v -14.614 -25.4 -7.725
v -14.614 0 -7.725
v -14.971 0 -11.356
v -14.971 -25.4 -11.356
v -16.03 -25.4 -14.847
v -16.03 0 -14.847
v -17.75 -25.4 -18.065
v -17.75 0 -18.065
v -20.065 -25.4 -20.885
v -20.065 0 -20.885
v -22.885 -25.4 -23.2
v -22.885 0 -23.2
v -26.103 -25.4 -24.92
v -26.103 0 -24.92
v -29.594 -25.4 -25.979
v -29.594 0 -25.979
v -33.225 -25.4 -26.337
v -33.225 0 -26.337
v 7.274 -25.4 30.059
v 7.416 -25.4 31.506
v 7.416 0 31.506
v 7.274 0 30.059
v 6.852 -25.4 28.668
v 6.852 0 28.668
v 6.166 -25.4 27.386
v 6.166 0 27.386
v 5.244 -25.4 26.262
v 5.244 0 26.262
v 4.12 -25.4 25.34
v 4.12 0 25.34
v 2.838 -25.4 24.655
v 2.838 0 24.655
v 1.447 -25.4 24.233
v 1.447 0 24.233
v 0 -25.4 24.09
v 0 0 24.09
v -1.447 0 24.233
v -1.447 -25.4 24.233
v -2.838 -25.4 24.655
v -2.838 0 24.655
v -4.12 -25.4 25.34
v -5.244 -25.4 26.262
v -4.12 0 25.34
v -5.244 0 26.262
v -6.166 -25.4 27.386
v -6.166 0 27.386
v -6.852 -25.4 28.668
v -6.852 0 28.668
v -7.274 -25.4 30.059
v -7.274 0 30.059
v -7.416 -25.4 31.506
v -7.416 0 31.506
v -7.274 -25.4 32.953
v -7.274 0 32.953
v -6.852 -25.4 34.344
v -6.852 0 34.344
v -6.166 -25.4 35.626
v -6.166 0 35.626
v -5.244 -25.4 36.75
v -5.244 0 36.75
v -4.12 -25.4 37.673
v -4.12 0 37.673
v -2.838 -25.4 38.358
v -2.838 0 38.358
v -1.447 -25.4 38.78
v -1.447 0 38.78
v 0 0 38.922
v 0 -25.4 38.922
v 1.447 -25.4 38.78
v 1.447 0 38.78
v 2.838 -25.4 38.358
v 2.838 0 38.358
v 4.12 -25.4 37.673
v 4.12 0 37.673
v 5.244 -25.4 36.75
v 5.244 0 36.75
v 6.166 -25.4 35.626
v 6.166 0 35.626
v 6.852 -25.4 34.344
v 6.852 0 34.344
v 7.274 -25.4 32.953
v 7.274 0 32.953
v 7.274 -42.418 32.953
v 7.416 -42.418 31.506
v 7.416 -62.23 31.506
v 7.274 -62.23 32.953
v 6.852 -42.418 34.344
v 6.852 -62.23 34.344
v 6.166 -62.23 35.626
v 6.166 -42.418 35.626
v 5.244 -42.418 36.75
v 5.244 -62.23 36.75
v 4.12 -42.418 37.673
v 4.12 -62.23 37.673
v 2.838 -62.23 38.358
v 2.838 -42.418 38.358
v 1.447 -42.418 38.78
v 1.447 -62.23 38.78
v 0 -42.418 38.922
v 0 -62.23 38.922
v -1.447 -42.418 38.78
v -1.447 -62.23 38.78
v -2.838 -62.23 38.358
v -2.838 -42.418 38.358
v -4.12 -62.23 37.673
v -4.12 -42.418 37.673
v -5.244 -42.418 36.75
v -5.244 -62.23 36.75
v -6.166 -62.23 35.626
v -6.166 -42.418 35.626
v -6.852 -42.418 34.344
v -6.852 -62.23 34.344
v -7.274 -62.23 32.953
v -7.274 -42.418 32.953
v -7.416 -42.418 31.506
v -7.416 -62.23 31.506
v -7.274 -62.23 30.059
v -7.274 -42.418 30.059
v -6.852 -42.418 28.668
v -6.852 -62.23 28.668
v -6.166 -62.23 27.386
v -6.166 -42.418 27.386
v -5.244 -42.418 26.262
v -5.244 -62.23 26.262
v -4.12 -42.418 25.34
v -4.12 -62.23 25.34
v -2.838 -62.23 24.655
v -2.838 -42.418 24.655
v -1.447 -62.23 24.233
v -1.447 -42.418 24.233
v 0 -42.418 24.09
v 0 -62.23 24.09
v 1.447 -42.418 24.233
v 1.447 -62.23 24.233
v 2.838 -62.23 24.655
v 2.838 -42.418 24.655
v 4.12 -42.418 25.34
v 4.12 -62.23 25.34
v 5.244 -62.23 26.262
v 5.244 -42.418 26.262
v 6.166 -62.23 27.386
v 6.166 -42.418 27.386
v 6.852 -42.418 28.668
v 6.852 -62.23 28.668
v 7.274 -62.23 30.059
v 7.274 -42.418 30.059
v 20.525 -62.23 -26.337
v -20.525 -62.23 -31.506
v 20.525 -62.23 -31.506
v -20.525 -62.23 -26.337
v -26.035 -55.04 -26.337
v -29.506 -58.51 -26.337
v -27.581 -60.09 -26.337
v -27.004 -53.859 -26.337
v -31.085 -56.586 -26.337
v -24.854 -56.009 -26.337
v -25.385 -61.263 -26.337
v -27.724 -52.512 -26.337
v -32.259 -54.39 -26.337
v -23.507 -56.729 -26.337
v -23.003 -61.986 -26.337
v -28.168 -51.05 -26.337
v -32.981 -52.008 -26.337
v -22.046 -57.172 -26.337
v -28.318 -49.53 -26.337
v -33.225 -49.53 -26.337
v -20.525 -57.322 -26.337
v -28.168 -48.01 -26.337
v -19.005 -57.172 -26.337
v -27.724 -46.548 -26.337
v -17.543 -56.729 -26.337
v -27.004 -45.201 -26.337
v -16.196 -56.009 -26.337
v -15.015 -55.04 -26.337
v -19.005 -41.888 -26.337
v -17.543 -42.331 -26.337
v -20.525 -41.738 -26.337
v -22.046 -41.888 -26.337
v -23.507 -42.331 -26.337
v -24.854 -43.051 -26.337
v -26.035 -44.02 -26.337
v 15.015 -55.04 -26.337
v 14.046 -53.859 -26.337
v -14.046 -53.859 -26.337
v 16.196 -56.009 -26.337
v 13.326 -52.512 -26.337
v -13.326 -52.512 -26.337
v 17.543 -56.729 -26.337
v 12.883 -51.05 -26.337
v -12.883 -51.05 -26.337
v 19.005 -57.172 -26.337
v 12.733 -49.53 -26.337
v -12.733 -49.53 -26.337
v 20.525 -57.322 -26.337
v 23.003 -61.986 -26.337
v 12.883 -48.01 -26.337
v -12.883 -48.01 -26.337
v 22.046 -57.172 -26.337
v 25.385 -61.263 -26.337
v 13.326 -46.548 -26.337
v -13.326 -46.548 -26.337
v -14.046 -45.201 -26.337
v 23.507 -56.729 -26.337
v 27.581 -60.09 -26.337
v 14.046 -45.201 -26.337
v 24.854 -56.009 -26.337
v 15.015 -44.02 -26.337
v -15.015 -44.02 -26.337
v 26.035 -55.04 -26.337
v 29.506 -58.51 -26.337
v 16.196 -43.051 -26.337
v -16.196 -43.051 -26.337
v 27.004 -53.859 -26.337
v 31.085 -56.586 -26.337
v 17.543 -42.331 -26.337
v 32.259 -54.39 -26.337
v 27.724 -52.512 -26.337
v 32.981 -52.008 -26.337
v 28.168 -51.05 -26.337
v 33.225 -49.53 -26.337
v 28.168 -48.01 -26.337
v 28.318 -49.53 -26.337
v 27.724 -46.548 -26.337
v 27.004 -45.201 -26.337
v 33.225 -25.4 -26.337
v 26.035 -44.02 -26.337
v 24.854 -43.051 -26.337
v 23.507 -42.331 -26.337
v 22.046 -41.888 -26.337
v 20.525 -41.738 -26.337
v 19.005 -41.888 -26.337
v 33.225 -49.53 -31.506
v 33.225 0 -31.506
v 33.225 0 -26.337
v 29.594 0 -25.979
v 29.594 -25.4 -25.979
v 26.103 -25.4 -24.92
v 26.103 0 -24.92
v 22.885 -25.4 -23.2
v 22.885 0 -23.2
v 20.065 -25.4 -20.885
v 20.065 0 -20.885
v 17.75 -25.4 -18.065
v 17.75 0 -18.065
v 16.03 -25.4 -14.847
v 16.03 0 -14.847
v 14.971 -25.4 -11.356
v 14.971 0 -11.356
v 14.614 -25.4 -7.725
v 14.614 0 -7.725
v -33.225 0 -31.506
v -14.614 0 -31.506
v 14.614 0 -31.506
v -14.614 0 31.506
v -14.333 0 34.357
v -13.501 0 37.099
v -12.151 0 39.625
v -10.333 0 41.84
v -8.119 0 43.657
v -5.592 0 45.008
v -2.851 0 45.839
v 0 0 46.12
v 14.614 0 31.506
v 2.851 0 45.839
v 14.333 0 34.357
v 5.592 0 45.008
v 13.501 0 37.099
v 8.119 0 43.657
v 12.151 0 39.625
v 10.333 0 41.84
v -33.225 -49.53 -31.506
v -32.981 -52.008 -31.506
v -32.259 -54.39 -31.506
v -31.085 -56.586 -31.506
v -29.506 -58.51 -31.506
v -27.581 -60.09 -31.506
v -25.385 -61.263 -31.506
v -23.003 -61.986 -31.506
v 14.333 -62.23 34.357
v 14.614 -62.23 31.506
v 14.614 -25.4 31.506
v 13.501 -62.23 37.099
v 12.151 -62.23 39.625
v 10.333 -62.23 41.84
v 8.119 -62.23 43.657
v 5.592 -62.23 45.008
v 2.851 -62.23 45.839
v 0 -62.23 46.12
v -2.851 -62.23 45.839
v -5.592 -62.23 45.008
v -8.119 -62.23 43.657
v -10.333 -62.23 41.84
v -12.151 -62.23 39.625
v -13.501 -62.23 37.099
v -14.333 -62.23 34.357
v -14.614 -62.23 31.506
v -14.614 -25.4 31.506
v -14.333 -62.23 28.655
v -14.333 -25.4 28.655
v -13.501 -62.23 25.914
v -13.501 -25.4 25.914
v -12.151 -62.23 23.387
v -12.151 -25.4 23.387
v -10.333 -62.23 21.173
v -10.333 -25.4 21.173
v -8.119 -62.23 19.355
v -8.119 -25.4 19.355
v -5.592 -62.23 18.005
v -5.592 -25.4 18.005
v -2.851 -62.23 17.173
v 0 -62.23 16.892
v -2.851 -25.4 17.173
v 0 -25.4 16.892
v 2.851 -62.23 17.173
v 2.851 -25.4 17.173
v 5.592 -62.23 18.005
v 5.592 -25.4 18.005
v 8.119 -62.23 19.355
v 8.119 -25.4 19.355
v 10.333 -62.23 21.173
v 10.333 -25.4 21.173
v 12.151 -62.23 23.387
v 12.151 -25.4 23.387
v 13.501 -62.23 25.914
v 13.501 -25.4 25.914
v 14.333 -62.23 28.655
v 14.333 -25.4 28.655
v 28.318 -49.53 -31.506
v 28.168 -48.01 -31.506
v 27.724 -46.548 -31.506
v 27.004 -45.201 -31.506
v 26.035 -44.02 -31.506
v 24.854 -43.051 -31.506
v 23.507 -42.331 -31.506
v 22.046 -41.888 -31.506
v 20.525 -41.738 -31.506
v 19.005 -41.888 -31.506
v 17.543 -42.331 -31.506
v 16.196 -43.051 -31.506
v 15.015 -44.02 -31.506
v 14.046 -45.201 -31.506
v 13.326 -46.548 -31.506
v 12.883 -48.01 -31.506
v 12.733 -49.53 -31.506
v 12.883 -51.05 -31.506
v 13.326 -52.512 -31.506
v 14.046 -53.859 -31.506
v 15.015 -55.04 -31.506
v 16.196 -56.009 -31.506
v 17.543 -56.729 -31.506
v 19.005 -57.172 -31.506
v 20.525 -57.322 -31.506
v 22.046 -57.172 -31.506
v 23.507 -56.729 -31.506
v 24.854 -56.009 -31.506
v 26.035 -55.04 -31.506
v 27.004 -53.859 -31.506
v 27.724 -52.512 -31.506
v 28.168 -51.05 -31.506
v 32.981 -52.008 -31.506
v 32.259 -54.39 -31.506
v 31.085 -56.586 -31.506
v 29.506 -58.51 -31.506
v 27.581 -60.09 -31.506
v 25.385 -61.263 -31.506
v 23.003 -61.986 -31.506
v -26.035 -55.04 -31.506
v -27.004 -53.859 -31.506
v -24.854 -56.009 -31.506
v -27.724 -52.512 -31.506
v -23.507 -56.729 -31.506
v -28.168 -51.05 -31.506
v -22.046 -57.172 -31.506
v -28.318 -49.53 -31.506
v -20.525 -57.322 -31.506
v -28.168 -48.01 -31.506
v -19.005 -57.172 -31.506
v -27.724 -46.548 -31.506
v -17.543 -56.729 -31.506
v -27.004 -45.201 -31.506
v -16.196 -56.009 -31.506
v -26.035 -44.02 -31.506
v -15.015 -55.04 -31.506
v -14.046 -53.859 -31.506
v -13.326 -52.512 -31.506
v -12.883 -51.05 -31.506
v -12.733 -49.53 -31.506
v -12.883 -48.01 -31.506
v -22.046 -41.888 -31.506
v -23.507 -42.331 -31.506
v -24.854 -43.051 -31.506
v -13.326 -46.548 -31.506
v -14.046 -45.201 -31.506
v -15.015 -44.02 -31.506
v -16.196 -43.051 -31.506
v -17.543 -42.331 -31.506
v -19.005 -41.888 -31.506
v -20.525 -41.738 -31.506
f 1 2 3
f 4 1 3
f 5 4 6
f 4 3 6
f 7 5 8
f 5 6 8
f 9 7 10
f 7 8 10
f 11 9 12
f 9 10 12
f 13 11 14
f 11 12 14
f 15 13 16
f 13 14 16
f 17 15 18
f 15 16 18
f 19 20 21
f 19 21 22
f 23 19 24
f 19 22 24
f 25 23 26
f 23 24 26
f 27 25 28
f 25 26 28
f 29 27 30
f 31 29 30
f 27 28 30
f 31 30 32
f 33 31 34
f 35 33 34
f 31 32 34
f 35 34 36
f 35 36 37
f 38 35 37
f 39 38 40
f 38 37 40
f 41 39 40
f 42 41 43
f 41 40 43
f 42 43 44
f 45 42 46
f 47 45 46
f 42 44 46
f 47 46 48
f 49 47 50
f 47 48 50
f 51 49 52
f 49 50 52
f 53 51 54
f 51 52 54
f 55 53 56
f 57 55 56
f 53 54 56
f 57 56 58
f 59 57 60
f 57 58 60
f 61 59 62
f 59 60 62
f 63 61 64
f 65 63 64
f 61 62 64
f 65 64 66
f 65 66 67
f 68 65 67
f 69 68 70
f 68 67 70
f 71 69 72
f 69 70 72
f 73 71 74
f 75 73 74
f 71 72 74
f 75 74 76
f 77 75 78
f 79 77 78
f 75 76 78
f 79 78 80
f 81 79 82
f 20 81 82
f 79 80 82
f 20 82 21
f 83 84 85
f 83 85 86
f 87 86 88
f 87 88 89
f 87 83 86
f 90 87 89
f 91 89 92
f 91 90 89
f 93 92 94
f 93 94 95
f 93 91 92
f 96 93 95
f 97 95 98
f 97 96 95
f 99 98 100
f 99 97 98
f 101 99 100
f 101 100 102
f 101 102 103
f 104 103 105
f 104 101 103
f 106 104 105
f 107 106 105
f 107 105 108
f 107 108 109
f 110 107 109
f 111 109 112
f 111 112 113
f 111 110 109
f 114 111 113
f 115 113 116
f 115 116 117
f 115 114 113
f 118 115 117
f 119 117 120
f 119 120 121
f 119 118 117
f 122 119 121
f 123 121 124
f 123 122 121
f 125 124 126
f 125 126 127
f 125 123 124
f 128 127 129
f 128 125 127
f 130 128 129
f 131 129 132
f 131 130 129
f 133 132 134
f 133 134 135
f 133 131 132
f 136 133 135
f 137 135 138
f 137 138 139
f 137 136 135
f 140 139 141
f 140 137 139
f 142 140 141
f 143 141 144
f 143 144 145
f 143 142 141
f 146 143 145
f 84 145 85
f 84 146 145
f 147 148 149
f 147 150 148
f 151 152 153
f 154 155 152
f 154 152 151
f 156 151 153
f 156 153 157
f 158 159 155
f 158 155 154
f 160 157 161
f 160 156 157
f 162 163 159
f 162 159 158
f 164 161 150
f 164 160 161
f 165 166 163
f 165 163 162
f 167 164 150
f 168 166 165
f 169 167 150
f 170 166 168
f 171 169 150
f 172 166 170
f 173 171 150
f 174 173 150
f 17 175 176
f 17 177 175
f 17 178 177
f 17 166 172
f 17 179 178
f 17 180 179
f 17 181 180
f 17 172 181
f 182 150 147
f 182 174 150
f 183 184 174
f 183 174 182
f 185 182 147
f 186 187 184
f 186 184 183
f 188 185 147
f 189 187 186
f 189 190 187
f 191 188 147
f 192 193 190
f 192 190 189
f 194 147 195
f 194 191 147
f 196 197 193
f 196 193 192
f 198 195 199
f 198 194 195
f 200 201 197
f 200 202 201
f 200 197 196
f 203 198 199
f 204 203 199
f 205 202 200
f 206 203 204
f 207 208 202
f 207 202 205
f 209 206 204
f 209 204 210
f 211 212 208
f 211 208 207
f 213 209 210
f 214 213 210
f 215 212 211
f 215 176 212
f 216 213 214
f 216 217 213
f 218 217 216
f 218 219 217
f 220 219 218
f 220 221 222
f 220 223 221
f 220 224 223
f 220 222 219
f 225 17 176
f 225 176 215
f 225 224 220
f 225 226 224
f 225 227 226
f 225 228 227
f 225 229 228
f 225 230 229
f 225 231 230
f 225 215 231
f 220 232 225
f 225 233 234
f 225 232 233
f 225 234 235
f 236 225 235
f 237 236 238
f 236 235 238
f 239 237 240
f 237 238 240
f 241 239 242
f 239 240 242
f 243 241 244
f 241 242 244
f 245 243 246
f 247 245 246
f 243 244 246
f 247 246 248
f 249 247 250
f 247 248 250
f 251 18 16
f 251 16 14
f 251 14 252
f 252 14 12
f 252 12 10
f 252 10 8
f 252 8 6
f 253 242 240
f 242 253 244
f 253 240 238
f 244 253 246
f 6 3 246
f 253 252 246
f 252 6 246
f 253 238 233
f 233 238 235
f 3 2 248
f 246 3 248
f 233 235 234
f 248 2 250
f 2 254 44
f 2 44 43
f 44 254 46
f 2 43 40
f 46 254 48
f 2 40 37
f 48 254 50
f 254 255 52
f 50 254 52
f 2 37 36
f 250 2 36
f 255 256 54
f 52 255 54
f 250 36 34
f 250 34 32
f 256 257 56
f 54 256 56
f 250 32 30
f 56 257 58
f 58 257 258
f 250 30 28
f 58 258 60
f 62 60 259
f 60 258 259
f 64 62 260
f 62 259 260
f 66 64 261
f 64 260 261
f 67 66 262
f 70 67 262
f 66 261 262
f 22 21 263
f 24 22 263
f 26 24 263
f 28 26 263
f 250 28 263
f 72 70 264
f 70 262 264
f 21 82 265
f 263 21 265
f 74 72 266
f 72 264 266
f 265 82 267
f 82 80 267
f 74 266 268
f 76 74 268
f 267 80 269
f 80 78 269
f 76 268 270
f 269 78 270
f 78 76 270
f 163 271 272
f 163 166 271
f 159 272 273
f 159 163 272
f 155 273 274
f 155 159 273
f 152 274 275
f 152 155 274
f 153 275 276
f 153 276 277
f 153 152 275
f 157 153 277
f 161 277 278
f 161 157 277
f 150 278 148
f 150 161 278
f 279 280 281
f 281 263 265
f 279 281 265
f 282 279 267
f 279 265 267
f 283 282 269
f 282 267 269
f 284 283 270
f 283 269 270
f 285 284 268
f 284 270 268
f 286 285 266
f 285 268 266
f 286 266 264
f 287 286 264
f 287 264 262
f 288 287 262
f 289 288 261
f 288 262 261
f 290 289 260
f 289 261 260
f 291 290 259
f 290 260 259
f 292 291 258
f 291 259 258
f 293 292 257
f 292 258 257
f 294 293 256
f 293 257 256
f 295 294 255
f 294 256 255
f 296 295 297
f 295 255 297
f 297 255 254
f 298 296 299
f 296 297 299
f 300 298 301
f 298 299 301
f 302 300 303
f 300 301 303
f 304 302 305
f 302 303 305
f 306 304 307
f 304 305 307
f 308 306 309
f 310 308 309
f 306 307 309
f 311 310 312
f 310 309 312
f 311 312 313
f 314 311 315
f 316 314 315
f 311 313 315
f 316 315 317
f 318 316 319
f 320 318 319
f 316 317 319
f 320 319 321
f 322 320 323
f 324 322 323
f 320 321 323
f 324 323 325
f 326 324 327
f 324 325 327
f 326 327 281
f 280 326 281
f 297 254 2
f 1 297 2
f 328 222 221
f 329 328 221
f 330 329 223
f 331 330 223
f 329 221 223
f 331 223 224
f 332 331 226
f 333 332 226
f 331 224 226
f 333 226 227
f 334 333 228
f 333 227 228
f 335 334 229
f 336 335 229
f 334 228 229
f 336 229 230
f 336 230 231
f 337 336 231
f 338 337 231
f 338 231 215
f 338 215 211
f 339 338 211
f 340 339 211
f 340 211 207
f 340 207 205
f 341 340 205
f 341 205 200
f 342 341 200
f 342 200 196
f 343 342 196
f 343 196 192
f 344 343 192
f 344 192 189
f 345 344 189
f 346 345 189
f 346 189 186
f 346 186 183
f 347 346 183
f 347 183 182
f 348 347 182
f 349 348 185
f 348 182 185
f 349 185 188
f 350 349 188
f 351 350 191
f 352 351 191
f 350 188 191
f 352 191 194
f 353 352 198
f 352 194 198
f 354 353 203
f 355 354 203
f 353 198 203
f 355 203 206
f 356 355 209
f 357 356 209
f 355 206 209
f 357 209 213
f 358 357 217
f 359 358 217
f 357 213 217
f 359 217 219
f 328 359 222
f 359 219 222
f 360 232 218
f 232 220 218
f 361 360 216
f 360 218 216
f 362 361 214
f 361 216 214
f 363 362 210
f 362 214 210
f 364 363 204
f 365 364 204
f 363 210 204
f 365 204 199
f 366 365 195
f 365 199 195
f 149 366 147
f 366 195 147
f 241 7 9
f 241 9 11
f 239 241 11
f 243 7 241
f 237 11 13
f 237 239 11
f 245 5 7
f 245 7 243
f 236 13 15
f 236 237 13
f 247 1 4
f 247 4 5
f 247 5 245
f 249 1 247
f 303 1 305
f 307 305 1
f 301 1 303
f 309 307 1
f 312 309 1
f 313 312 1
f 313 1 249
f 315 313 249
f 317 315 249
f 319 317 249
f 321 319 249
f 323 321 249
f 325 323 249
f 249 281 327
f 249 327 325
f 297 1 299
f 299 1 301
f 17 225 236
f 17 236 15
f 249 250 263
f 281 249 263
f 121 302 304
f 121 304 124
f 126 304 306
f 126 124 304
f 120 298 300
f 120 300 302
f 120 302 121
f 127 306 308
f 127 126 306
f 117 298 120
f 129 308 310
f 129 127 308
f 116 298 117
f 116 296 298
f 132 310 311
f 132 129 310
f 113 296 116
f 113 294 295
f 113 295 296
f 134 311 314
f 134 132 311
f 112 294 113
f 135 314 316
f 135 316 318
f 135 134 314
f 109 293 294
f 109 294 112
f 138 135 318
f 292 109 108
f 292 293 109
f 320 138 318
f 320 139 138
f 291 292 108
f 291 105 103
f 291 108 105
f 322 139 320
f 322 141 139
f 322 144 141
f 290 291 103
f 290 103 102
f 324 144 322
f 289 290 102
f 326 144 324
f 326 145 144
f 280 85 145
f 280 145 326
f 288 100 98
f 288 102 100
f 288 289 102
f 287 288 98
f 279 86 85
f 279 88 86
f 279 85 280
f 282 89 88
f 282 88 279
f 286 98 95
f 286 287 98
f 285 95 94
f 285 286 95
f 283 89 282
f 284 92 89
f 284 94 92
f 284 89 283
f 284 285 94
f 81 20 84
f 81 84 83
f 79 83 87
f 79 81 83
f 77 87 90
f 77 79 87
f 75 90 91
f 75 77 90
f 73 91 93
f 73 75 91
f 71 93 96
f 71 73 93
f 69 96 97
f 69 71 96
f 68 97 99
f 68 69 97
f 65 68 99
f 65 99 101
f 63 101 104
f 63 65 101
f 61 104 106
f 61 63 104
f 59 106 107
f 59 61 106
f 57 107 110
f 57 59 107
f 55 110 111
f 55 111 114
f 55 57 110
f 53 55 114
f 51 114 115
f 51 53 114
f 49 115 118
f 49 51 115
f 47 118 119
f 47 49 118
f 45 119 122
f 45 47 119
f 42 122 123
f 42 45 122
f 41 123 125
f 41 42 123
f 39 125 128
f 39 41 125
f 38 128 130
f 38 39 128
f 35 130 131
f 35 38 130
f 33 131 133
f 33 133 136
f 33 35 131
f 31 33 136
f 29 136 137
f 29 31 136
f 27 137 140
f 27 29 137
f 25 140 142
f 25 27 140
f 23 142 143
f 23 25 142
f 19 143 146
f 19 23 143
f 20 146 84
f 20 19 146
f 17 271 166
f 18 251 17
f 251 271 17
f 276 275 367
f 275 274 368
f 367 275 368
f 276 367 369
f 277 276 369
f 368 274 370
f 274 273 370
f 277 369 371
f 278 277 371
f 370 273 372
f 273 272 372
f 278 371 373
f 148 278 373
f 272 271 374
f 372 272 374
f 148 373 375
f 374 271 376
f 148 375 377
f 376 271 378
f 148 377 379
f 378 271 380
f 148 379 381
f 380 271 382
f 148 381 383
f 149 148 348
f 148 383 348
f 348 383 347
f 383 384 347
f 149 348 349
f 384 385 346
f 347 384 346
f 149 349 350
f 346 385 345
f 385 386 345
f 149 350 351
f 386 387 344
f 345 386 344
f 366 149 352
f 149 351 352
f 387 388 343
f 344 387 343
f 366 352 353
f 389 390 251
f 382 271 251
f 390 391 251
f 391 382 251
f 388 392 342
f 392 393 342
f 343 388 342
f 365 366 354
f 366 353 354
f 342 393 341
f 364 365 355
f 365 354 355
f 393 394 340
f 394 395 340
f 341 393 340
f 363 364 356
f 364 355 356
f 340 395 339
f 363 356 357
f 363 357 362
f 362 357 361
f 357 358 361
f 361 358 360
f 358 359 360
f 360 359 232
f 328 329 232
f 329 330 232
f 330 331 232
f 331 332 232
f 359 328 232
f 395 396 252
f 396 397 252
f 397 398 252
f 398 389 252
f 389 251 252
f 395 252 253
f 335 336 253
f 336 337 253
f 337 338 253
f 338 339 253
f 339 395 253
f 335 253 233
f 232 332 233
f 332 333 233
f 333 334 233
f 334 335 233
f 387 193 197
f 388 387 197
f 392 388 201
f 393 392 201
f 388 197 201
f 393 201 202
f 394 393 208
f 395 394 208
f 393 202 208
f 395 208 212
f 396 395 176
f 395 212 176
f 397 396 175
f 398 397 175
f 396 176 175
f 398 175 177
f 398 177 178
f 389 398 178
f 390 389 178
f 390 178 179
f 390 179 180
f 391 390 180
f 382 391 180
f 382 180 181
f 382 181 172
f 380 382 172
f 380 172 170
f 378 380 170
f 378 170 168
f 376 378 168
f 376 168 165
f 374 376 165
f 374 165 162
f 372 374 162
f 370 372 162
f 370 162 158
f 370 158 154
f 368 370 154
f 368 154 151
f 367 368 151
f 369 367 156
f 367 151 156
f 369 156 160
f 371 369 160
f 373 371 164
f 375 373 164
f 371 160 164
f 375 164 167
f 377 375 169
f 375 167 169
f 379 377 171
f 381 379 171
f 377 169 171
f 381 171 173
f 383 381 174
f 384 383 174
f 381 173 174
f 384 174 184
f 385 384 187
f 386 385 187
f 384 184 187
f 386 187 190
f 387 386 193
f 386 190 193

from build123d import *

# Parameters (mm, degrees)
F0_W     = 29.2275138199
F0_H     = 23.781274911
F1_DEPTH = 25.4
F2_R     = 14.61375691
F2_R_2   = 7.4161763195
F3_DEPTH = 17.018
F4_W     = 66.4506405592
F4_H     = 5.1697115414
F5_DEPTH = 36.83
F6_R     = 12.7
F7_R     = 7.792205292
F8_DEPTH = 5.1707115414
F9_DEPTH = 19.812


with BuildPart() as f1:
    # F0 (on Front) → F1 (new body)
    with BuildSketch(Plane.XZ):
        with BuildLine():
            Line((7.4161763195, 31.5062142909), (14.61375691, 31.5062142909))
            ThreePointArc((14.61375691, 31.5062142909), (0, 46.1199712008), (-14.61375691, 31.5062142909))
            Line((-14.61375691, 31.5062142909), (-7.4161763195, 31.5062142909))
            ThreePointArc((-7.4161763195, 31.5062142909), (0, 38.9223906104), (7.4161763195, 31.5062142909))
        make_face()
        with BuildLine():
            Line((14.61375691, -7.7249393798), (14.61375691, -31.5062142909))
            Line((14.61375691, -31.5062142909), (33.2253202796, -31.5062142909))
            Line((33.2253202796, -31.5062142909), (33.2253202796, -26.3365027495))
            ThreePointArc((33.2253202796, -26.3365027495), (20.0649576124, -20.885302047), (14.61375691, -7.7249393798))
        make_face()
        with BuildLine():
            Line((-14.61375691, -7.7249393798), (14.61375691, -7.7249393798))
            Line((14.61375691, -7.7249393798), (14.61375691, 31.5062142909))
            ThreePointArc((14.61375691, 31.5062142909), (0, 16.8924573809), (-14.61375691, 31.5062142909))
            Line((-14.61375691, 31.5062142909), (-14.61375691, -7.7249393798))
        make_face()
        with BuildLine():
            Line((-33.2253202796, -31.5062142909), (-14.61375691, -31.5062142909))
            Line((-14.61375691, -31.5062142909), (-14.61375691, -7.7249393798))
            ThreePointArc((-14.61375691, -7.7249393798), (-20.0649576124, -20.885302047), (-33.2253202796, -26.3365027495))
            Line((-33.2253202796, -26.3365027495), (-33.2253202796, -31.5062142909))
        make_face()
        with BuildLine():
            ThreePointArc((-14.61375691, 31.5062142909), (0, 16.8924573809), (14.61375691, 31.5062142909))
            Line((14.61375691, 31.5062142909), (7.4161763195, 31.5062142909))
            ThreePointArc((7.4161763195, 31.5062142909), (0, 24.0900379714), (-7.4161763195, 31.5062142909))
            Line((-7.4161763195, 31.5062142909), (-14.61375691, 31.5062142909))
        make_face()
        with Locations((0, -19.6155768353)):
            Rectangle(F0_W, F0_H)
    extrude(amount=F1_DEPTH)

    # F2 (on face) → F3 (join)
    with BuildSketch(Plane.XZ.offset(25.4)):
        with Locations((0, 31.5062142909)):
            Circle(F2_R)
        with Locations((0, 31.5062142909)):
            Circle(F2_R_2, mode=Mode.SUBTRACT)
    extrude(amount=F3_DEPTH)

    # F4 (on face) → F5 (join)
    with BuildSketch(Plane.XZ.offset(25.4)):
        with Locations((0, -28.9213585202)):
            Rectangle(F4_W, F4_H)
    extrude(amount=F5_DEPTH)

    # F6
    f6_edges = [f1.edges().sort_by_distance(p)[0] for p in [
        (-33.22532, -62.23, -28.921359),
        (33.22532, -62.23, -28.921359),
    ]]
    fillet(f6_edges, radius=F6_R)

    # F7 (on face) → F8 (cut, through all)
    with BuildSketch(Plane.XY.offset(-26.3365027495)):
        with Locations((-20.5253202796, -49.53)):
            Circle(F7_R)
        with Locations((20.5253202796, -49.53)):
            Circle(F7_R)
    extrude(amount=-F8_DEPTH, mode=Mode.SUBTRACT)

    # F9 (add, through all): a face of the model
    f9_faces = [f1.faces().sort_by_distance(p)[0] for p in [
        (-14.2004174456, -42.418, 31.5062142909),
    ]]
    extrude(f9_faces, amount=F9_DEPTH)


solid = f1.part
